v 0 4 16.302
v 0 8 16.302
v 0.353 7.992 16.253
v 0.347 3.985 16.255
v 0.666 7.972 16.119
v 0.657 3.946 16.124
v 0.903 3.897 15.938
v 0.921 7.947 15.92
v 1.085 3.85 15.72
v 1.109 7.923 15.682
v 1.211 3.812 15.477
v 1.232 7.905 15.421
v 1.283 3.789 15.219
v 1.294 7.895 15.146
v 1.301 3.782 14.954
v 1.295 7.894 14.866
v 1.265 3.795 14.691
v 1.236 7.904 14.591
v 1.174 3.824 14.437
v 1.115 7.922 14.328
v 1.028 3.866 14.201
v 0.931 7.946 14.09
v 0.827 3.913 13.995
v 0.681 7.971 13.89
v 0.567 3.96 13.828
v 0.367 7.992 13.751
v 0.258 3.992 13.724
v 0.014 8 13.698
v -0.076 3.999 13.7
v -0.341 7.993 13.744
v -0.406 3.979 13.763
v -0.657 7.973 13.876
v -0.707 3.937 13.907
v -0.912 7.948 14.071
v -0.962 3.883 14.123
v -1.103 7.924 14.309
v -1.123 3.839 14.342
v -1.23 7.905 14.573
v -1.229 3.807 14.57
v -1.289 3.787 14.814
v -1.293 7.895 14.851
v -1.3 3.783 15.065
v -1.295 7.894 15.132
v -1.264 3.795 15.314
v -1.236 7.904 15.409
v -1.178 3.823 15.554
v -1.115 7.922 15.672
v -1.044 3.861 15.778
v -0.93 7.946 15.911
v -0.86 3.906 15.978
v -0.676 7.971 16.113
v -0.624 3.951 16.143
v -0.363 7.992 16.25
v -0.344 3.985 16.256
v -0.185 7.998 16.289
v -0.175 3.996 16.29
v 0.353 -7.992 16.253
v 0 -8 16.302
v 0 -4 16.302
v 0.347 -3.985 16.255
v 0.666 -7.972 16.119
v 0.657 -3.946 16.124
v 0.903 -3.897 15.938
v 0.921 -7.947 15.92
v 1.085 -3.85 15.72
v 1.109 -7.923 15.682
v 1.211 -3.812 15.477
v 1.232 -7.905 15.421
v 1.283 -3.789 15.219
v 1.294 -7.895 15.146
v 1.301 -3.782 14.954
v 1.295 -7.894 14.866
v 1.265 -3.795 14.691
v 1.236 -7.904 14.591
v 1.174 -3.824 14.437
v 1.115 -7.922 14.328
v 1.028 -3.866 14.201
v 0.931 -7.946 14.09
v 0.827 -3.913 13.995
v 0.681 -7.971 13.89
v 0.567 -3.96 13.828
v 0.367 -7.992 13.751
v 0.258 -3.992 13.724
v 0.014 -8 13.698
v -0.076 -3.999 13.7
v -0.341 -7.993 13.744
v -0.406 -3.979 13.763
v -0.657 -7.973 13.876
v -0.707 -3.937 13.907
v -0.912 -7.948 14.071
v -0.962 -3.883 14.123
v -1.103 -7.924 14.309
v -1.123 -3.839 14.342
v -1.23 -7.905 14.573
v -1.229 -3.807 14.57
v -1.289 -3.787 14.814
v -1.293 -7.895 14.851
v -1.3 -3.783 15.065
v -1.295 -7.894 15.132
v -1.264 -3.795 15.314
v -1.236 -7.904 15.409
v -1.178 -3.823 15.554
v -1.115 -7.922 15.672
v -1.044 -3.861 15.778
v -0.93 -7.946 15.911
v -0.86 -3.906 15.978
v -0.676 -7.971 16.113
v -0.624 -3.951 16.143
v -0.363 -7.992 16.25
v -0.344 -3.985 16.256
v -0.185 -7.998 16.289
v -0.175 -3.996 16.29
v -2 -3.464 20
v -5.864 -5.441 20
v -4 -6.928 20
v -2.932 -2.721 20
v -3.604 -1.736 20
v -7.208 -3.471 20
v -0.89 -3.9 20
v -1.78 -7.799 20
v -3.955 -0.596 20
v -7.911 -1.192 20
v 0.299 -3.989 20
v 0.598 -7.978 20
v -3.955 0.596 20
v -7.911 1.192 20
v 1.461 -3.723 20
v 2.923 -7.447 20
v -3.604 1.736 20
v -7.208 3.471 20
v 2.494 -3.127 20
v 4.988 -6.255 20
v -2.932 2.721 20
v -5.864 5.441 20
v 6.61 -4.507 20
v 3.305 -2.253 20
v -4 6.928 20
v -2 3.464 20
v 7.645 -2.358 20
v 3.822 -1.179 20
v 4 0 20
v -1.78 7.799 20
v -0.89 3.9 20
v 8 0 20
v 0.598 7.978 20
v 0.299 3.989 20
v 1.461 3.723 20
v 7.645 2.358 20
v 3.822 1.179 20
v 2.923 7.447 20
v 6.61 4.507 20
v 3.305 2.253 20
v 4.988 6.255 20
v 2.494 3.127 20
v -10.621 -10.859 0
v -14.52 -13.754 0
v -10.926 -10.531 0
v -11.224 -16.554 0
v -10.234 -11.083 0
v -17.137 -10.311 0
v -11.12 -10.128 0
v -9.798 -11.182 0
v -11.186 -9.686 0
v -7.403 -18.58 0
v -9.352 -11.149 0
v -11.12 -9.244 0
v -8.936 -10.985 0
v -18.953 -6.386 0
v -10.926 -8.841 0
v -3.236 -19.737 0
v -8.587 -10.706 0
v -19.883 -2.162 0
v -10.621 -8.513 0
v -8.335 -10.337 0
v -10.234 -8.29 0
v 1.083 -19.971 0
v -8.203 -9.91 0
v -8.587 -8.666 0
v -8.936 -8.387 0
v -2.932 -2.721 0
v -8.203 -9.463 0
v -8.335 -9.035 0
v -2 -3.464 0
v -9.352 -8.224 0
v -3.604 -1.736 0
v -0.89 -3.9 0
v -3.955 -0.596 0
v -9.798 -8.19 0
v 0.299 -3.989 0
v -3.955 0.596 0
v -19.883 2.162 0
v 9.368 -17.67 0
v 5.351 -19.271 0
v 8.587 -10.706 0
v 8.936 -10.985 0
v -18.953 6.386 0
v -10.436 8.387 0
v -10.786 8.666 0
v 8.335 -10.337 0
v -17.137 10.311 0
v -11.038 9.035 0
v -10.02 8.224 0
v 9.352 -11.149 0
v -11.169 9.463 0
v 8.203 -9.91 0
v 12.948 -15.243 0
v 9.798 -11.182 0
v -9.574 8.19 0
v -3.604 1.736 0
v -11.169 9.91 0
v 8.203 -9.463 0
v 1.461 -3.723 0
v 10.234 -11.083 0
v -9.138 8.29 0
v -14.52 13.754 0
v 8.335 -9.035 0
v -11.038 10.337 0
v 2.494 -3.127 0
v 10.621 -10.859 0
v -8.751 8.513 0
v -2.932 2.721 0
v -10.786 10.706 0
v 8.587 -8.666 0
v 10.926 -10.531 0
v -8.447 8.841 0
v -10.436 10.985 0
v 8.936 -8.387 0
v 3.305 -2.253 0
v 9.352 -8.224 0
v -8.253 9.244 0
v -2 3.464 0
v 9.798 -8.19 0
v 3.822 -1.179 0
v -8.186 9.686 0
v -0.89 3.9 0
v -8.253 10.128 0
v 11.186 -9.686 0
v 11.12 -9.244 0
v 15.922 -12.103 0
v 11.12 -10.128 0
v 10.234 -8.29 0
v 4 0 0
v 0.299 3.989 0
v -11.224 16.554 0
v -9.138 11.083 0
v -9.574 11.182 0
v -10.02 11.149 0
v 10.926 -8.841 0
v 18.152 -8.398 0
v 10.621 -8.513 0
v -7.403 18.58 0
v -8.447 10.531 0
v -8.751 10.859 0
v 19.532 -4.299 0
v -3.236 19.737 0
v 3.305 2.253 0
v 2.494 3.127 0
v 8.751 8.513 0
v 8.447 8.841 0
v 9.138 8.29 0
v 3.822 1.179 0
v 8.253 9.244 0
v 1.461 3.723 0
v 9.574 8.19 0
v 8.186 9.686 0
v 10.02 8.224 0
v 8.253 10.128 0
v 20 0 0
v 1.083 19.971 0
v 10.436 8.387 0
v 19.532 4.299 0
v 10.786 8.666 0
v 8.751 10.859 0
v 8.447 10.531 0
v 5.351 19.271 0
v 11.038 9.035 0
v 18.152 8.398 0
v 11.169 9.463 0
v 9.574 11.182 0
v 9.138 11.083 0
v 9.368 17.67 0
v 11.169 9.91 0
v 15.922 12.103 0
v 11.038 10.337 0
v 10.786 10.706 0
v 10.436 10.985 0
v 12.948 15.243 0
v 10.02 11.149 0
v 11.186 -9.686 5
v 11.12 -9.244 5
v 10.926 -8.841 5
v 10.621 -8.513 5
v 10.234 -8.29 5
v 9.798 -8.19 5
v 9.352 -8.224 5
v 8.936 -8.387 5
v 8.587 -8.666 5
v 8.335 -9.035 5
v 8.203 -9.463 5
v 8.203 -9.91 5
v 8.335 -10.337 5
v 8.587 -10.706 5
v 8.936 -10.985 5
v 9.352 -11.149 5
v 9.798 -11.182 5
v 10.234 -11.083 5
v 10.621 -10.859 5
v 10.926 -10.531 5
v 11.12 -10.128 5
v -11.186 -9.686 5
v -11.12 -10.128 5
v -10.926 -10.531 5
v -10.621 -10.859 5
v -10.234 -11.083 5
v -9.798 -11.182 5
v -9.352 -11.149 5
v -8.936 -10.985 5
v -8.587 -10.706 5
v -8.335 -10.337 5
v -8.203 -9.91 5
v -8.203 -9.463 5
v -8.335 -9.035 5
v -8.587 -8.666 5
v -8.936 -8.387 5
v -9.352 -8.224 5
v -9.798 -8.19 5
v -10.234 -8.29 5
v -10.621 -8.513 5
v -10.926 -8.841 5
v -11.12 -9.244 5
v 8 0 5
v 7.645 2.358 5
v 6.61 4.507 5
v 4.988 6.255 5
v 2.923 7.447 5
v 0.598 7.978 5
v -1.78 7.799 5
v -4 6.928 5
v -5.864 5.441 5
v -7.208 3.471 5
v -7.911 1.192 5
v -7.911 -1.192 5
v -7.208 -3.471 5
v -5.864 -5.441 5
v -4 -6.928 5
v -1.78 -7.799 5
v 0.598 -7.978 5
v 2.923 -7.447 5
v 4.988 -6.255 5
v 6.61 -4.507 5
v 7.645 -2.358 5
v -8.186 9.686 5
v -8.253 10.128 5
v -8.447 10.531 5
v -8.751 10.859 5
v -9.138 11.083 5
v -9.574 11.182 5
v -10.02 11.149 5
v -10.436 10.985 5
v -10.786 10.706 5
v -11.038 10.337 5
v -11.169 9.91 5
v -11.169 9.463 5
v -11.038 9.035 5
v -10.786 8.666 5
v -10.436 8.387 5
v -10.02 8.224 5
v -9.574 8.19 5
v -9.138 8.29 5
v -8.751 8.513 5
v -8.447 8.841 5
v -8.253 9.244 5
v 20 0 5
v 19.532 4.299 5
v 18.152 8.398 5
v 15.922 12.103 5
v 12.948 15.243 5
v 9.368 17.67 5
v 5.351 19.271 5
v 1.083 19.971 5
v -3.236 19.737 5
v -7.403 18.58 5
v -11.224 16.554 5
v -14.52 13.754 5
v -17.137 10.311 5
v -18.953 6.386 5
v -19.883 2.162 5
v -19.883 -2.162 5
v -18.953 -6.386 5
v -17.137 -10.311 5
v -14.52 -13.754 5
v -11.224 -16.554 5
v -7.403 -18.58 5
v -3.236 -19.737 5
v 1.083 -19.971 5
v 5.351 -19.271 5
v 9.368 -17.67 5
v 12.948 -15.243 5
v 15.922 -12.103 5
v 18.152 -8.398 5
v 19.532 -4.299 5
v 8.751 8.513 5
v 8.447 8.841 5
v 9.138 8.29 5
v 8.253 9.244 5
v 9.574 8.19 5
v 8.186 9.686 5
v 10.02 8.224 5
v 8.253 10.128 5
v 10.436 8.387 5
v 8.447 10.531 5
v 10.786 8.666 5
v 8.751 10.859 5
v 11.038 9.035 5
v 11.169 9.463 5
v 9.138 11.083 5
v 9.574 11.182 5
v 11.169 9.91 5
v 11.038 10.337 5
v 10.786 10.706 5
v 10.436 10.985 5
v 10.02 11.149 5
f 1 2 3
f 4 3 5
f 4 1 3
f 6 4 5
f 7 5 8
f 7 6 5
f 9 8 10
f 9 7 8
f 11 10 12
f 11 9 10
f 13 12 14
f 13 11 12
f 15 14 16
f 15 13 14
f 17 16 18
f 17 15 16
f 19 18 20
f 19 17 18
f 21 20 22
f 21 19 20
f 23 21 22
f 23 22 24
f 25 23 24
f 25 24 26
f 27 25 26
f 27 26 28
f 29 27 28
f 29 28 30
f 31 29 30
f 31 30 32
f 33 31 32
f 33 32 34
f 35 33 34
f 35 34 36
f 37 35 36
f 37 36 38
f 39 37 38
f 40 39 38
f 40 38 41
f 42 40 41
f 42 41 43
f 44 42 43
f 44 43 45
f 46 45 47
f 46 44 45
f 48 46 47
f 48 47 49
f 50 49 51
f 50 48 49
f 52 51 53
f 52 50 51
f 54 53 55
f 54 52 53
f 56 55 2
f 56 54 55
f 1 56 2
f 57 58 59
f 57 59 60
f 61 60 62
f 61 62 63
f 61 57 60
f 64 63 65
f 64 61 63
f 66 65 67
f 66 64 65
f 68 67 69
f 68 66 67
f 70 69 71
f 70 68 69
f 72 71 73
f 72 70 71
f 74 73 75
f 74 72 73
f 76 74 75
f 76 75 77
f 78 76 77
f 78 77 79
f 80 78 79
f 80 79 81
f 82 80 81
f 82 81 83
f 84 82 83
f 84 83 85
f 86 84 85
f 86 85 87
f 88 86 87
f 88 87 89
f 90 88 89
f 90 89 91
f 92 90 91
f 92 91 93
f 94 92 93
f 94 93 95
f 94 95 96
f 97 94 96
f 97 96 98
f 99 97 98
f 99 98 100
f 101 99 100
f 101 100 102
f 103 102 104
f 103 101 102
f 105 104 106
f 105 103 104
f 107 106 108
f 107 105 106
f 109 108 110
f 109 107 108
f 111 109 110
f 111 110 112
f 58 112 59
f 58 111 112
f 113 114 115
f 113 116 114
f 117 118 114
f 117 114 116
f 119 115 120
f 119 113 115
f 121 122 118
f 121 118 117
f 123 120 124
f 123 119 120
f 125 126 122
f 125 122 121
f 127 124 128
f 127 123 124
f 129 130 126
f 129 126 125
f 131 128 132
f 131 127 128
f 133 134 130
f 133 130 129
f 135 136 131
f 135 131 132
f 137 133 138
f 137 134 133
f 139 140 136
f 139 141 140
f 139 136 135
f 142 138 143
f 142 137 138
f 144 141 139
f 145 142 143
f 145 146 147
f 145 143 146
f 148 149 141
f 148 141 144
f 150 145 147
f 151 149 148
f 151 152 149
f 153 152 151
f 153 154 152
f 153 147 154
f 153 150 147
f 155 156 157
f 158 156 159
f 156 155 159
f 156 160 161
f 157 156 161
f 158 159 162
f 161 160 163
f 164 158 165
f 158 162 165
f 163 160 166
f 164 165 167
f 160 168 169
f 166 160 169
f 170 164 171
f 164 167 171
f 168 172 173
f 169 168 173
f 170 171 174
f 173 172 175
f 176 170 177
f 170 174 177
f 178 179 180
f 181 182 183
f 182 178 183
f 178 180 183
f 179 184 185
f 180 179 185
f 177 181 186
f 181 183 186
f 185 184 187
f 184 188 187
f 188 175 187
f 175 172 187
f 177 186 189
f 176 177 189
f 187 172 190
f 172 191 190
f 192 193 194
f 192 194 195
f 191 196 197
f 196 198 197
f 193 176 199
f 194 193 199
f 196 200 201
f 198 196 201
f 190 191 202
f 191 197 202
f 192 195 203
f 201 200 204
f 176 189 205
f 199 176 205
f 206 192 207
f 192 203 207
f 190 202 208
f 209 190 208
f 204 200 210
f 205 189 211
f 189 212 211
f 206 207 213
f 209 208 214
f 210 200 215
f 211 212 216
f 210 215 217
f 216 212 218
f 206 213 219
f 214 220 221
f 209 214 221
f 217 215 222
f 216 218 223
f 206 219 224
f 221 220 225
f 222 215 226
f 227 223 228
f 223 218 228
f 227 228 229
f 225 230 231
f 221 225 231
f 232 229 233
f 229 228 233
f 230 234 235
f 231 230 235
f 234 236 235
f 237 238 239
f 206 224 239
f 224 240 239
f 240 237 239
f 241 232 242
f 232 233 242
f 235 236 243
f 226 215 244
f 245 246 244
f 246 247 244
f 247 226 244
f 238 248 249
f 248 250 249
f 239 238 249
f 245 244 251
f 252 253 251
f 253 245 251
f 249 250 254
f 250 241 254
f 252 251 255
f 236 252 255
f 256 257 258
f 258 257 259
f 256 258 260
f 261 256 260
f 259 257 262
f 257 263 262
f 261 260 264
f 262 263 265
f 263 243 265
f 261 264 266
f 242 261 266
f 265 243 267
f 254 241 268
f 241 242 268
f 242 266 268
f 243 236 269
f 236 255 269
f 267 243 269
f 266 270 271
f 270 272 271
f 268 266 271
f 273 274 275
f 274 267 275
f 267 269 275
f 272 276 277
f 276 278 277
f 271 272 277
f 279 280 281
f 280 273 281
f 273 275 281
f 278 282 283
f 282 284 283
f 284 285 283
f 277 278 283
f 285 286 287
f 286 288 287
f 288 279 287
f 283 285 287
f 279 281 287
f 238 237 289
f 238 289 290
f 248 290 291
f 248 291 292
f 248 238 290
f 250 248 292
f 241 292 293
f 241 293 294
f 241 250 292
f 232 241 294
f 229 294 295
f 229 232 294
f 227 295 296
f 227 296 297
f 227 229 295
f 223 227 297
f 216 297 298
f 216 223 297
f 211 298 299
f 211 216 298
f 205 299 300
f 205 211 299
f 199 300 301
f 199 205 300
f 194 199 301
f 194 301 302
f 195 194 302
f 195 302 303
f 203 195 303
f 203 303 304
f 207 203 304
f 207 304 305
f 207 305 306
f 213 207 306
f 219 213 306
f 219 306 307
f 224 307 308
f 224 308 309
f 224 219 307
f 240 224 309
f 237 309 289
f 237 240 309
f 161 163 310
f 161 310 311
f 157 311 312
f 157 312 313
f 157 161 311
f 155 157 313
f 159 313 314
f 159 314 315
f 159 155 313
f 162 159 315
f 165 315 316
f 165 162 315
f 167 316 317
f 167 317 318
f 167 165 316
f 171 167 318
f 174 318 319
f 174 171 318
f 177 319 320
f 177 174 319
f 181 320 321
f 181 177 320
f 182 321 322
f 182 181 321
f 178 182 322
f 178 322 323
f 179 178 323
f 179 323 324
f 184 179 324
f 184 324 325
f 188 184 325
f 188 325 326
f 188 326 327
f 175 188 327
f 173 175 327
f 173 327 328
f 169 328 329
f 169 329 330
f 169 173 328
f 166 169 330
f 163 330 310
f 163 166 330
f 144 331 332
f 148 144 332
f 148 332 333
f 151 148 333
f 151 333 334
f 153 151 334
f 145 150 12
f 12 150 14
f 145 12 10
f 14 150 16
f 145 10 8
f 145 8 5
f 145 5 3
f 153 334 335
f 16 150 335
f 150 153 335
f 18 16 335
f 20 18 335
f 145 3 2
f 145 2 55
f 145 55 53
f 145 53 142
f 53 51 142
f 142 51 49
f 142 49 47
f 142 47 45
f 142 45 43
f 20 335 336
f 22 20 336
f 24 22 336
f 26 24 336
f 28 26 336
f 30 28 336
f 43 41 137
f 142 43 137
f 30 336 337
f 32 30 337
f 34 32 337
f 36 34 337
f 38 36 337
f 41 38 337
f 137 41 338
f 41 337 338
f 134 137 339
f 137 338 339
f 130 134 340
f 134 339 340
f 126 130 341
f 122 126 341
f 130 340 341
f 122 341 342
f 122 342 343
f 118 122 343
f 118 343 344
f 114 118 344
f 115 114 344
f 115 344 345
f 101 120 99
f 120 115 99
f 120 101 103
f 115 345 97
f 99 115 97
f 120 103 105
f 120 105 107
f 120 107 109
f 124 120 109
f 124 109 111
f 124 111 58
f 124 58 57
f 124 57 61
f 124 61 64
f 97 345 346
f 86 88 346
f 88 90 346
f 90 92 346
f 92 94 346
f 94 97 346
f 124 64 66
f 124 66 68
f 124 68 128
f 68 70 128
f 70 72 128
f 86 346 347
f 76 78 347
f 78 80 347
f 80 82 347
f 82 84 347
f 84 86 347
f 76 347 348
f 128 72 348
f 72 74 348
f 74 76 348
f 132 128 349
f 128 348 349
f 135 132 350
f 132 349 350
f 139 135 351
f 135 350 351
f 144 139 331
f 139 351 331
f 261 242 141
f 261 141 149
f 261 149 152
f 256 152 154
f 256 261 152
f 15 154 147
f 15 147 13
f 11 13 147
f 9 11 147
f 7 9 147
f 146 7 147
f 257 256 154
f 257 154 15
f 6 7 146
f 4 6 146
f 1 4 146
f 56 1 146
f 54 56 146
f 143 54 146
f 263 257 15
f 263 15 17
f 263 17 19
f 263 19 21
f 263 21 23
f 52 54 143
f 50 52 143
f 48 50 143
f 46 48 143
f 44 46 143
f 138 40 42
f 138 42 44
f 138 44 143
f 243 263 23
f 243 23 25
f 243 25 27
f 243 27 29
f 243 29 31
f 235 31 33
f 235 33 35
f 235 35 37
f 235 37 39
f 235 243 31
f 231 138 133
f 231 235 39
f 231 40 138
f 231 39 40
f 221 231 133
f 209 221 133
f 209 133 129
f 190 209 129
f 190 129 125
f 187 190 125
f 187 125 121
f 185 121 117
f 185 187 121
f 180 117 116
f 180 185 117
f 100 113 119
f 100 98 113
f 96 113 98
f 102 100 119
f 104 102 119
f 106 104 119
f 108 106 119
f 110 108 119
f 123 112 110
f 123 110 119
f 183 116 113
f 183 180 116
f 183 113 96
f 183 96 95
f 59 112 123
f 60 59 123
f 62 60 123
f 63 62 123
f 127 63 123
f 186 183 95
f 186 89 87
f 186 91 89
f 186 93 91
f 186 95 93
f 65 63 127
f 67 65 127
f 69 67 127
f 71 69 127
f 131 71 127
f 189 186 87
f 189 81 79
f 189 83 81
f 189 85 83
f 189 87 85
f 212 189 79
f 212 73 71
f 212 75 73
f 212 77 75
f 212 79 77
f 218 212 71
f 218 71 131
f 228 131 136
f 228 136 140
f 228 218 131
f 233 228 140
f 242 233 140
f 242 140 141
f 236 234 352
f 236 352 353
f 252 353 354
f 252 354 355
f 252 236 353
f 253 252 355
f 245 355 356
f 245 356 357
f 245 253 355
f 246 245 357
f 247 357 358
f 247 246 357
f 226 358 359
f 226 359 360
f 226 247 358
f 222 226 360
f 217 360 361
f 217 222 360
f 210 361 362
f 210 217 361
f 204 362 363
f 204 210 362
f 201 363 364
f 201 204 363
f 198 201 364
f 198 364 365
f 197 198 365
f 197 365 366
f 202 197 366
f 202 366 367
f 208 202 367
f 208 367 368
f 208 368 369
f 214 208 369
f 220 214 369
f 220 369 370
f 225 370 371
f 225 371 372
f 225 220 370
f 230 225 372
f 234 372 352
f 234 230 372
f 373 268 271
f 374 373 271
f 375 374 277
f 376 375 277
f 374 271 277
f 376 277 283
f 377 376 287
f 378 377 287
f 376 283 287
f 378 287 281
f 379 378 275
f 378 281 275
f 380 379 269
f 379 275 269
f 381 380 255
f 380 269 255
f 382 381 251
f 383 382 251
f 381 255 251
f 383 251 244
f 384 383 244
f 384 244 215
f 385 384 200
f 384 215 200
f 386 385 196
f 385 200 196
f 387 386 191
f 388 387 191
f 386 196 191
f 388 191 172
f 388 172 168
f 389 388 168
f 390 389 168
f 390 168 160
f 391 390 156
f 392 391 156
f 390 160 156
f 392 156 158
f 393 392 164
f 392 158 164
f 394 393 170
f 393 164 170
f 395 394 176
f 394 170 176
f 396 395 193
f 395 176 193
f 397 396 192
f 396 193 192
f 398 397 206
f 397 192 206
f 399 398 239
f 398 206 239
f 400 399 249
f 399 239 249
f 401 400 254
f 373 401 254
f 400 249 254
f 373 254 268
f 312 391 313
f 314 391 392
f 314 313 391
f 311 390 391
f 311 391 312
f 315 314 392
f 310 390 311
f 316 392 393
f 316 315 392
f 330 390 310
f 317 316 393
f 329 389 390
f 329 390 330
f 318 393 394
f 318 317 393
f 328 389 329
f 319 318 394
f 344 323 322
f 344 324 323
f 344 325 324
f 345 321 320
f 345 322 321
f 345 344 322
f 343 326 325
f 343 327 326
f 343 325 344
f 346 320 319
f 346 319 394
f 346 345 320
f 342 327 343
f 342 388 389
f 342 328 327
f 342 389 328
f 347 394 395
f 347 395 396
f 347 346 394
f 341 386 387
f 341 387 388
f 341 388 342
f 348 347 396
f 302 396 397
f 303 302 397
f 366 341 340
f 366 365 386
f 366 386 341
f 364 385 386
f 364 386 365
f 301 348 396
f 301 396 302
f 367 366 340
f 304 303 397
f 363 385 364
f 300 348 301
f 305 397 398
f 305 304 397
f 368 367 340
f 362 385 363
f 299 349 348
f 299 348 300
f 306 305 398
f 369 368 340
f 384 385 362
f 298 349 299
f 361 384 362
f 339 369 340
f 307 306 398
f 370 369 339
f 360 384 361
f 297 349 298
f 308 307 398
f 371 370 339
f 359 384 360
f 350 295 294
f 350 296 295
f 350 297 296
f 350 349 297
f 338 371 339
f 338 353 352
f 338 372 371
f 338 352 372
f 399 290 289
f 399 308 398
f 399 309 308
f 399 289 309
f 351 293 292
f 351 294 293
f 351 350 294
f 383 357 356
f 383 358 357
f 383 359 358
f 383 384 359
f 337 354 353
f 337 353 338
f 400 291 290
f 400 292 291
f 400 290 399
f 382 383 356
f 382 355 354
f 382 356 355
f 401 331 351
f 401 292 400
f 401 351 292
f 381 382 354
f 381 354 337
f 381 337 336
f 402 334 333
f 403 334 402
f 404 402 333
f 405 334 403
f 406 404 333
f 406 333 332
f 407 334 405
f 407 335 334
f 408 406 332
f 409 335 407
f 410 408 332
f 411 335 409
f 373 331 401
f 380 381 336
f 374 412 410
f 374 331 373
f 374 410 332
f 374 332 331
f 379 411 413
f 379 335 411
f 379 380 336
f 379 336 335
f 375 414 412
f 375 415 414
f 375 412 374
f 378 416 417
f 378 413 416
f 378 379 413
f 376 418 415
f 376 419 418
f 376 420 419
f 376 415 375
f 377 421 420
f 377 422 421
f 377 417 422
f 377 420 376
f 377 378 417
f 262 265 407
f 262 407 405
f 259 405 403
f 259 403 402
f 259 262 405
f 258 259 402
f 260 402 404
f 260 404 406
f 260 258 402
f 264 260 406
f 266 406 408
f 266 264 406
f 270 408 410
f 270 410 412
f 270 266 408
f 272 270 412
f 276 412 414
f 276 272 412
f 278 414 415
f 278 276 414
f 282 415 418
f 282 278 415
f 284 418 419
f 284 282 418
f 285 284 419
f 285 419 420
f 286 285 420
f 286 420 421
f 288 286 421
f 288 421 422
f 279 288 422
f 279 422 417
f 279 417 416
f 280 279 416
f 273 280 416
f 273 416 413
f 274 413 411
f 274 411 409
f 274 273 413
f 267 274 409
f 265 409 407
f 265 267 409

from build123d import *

# Parameters (mm, degrees)
SKETCH1_R               = 20
SKETCH1_R_2             = 4
SKETCH1_R_3             = 1.5
BOSS_EXTRUDE1_DEPTH     = 5
SKETCH2_R               = 8
SKETCH2_R_2             = 4
BOSS_EXTRUDE2_DEPTH     = 15
CUT_EXTRUDE1_DEPTH      = 35.641016151
CUT_EXTRUDE1_DEPTH_BACK = 35.641016151
SKETCH3_R               = 1.301925598


with BuildPart() as part:
    # Sketch1 → Boss-Extrude1 (new body)
    with BuildSketch(Plane.XY):
        Circle(SKETCH1_R)
        Circle(SKETCH1_R_2, mode=Mode.SUBTRACT)
        with Locations((-9.686203462, 9.686203462)):
            Circle(SKETCH1_R_3, mode=Mode.SUBTRACT)
        with Locations(Location((9.686203462, 9.686203462, 0), (0, 0, 180))):
            Circle(SKETCH1_R_3, mode=Mode.SUBTRACT)
        with Locations((9.686203462, -9.686203462)):
            Circle(SKETCH1_R_3, mode=Mode.SUBTRACT)
        with Locations(Location((-9.686203462, -9.686203462, 0), (0, 0, 180))):
            Circle(SKETCH1_R_3, mode=Mode.SUBTRACT)
    extrude(amount=BOSS_EXTRUDE1_DEPTH)

    # Sketch2 → Boss-Extrude2 (add)
    with BuildSketch(Plane.XY.offset(5)):
        Circle(SKETCH2_R)
        Circle(SKETCH2_R_2, mode=Mode.SUBTRACT)
    extrude(amount=BOSS_EXTRUDE2_DEPTH)

    # Sketch3 → Cut-Extrude1 (cut, two sides: drawn at the far end of the back side and taken through both)
    with BuildSketch(Plane(origin=(0, 0, 0), x_dir=(1, 0, 0), z_dir=(0, 1, 0)).offset(-CUT_EXTRUDE1_DEPTH_BACK)):
        with Locations(Location((0, -15, 0), (0, 0, 270))):
            Circle(SKETCH3_R)
    extrude(amount=CUT_EXTRUDE1_DEPTH + CUT_EXTRUDE1_DEPTH_BACK, mode=Mode.SUBTRACT)


solid = part.part
